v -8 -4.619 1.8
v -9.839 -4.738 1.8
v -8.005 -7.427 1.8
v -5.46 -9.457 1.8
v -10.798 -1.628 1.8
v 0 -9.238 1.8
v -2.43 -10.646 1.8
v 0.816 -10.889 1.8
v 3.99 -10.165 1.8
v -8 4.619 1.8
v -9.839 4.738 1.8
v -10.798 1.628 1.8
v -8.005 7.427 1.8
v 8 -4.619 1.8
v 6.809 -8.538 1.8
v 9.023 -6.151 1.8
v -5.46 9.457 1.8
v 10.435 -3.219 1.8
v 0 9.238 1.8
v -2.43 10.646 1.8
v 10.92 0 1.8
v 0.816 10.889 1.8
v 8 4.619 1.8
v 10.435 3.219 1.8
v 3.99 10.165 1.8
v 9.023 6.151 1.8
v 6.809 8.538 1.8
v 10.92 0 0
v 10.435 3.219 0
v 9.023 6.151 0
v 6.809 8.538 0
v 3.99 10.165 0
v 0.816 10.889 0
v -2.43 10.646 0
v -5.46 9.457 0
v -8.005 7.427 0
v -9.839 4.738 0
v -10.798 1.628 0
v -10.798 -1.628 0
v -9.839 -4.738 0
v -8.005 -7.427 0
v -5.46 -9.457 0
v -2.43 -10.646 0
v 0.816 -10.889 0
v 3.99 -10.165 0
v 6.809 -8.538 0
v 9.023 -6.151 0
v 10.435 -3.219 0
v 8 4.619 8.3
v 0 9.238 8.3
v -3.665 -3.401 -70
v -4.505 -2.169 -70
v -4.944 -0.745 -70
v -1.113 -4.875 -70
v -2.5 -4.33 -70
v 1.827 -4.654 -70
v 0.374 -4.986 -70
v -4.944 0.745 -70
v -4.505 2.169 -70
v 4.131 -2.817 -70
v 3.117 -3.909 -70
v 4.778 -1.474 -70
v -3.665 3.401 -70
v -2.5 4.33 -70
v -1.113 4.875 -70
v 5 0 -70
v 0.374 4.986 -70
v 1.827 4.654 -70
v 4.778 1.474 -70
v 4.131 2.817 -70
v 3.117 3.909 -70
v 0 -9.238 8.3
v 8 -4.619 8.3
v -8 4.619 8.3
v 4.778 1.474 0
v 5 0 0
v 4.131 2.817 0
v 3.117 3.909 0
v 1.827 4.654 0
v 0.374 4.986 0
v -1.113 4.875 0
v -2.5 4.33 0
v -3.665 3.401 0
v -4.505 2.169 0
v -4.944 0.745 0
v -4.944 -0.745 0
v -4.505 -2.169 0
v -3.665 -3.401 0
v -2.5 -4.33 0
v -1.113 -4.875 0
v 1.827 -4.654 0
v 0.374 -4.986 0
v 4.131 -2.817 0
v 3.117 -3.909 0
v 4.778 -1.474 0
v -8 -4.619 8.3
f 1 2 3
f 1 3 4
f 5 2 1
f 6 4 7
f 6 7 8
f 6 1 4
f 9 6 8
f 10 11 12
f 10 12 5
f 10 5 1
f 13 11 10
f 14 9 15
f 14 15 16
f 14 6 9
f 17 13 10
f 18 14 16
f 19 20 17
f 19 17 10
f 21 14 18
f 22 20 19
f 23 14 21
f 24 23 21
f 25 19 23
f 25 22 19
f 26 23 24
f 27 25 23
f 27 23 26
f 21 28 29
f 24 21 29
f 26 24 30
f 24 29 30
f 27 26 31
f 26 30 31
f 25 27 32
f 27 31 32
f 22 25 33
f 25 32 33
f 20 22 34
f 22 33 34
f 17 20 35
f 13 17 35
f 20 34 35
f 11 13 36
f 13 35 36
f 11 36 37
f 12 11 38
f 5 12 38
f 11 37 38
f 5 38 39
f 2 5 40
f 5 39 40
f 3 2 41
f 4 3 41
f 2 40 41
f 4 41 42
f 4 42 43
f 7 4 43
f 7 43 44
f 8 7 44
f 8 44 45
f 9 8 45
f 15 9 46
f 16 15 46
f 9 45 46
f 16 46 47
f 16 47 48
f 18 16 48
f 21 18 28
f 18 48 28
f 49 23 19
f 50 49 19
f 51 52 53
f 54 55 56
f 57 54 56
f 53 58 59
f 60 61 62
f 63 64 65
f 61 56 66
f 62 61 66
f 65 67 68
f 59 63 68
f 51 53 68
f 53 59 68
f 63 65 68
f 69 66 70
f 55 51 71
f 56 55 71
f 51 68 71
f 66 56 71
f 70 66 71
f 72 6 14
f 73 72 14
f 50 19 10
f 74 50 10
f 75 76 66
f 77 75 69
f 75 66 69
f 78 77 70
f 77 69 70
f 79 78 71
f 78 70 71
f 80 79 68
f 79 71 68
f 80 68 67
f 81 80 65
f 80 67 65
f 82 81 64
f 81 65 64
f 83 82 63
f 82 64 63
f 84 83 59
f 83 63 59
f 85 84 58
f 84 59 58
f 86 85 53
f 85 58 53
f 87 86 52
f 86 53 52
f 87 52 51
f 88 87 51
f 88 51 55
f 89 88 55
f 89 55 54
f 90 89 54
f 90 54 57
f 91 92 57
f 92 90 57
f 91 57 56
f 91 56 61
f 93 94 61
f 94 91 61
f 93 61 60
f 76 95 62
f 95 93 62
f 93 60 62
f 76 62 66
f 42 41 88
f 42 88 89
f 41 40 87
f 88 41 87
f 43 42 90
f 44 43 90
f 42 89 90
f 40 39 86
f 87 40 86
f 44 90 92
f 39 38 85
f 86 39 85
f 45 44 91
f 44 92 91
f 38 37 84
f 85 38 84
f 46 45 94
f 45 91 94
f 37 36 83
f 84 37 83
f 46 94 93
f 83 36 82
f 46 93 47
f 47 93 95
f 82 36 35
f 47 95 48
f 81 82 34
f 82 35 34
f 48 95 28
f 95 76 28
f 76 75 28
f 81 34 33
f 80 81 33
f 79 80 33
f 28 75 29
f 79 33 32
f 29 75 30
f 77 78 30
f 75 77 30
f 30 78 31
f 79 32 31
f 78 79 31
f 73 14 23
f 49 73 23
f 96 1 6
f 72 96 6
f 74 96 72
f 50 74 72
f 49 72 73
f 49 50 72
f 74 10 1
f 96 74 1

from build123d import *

# Parameters (mm, degrees)
EXTRUDE_SKETCH_1_R = 10.92
EXTRUDE_1_DEPTH    = 1.8
EXTRUDE_START      = 1.8
EXTRUDE_2_DEPTH    = 6.5
EXTRUDE_START_2    = -70
EXTRUDE_SKETCH_3_R = 5
EXTRUDE_3_DEPTH    = 70.01


with BuildPart() as part:
    # Extrude sketch 1 → Extrude 1 (new body)
    with BuildSketch(Plane.XY):
        Circle(EXTRUDE_SKETCH_1_R)
    extrude(amount=EXTRUDE_1_DEPTH)


with BuildPart() as body_2:
    # Extrude sketch 2 → Extrude 2 (new body)
    with BuildSketch(Plane.XY.offset(EXTRUDE_START)):
        Polygon((8, 4.618802154), (0, 9.237604307), (-8, 4.618802154), (-8, -4.618802154), (0, -9.237604307), (8, -4.618802154), align=None)
    extrude(amount=EXTRUDE_2_DEPTH)


with BuildPart() as body_3:
    # Extrude sketch 3 → Extrude 3 (new body)
    with BuildSketch(Plane.XY.offset(EXTRUDE_START_2)):
        Circle(EXTRUDE_SKETCH_3_R)
    extrude(amount=EXTRUDE_3_DEPTH)


with BuildPart() as part_1:
    add(part.part)

    # Combine (weld / assembly of features): union body 3, body 2
    add(body_3.part)
    add(body_2.part)


solid = part_1.part
